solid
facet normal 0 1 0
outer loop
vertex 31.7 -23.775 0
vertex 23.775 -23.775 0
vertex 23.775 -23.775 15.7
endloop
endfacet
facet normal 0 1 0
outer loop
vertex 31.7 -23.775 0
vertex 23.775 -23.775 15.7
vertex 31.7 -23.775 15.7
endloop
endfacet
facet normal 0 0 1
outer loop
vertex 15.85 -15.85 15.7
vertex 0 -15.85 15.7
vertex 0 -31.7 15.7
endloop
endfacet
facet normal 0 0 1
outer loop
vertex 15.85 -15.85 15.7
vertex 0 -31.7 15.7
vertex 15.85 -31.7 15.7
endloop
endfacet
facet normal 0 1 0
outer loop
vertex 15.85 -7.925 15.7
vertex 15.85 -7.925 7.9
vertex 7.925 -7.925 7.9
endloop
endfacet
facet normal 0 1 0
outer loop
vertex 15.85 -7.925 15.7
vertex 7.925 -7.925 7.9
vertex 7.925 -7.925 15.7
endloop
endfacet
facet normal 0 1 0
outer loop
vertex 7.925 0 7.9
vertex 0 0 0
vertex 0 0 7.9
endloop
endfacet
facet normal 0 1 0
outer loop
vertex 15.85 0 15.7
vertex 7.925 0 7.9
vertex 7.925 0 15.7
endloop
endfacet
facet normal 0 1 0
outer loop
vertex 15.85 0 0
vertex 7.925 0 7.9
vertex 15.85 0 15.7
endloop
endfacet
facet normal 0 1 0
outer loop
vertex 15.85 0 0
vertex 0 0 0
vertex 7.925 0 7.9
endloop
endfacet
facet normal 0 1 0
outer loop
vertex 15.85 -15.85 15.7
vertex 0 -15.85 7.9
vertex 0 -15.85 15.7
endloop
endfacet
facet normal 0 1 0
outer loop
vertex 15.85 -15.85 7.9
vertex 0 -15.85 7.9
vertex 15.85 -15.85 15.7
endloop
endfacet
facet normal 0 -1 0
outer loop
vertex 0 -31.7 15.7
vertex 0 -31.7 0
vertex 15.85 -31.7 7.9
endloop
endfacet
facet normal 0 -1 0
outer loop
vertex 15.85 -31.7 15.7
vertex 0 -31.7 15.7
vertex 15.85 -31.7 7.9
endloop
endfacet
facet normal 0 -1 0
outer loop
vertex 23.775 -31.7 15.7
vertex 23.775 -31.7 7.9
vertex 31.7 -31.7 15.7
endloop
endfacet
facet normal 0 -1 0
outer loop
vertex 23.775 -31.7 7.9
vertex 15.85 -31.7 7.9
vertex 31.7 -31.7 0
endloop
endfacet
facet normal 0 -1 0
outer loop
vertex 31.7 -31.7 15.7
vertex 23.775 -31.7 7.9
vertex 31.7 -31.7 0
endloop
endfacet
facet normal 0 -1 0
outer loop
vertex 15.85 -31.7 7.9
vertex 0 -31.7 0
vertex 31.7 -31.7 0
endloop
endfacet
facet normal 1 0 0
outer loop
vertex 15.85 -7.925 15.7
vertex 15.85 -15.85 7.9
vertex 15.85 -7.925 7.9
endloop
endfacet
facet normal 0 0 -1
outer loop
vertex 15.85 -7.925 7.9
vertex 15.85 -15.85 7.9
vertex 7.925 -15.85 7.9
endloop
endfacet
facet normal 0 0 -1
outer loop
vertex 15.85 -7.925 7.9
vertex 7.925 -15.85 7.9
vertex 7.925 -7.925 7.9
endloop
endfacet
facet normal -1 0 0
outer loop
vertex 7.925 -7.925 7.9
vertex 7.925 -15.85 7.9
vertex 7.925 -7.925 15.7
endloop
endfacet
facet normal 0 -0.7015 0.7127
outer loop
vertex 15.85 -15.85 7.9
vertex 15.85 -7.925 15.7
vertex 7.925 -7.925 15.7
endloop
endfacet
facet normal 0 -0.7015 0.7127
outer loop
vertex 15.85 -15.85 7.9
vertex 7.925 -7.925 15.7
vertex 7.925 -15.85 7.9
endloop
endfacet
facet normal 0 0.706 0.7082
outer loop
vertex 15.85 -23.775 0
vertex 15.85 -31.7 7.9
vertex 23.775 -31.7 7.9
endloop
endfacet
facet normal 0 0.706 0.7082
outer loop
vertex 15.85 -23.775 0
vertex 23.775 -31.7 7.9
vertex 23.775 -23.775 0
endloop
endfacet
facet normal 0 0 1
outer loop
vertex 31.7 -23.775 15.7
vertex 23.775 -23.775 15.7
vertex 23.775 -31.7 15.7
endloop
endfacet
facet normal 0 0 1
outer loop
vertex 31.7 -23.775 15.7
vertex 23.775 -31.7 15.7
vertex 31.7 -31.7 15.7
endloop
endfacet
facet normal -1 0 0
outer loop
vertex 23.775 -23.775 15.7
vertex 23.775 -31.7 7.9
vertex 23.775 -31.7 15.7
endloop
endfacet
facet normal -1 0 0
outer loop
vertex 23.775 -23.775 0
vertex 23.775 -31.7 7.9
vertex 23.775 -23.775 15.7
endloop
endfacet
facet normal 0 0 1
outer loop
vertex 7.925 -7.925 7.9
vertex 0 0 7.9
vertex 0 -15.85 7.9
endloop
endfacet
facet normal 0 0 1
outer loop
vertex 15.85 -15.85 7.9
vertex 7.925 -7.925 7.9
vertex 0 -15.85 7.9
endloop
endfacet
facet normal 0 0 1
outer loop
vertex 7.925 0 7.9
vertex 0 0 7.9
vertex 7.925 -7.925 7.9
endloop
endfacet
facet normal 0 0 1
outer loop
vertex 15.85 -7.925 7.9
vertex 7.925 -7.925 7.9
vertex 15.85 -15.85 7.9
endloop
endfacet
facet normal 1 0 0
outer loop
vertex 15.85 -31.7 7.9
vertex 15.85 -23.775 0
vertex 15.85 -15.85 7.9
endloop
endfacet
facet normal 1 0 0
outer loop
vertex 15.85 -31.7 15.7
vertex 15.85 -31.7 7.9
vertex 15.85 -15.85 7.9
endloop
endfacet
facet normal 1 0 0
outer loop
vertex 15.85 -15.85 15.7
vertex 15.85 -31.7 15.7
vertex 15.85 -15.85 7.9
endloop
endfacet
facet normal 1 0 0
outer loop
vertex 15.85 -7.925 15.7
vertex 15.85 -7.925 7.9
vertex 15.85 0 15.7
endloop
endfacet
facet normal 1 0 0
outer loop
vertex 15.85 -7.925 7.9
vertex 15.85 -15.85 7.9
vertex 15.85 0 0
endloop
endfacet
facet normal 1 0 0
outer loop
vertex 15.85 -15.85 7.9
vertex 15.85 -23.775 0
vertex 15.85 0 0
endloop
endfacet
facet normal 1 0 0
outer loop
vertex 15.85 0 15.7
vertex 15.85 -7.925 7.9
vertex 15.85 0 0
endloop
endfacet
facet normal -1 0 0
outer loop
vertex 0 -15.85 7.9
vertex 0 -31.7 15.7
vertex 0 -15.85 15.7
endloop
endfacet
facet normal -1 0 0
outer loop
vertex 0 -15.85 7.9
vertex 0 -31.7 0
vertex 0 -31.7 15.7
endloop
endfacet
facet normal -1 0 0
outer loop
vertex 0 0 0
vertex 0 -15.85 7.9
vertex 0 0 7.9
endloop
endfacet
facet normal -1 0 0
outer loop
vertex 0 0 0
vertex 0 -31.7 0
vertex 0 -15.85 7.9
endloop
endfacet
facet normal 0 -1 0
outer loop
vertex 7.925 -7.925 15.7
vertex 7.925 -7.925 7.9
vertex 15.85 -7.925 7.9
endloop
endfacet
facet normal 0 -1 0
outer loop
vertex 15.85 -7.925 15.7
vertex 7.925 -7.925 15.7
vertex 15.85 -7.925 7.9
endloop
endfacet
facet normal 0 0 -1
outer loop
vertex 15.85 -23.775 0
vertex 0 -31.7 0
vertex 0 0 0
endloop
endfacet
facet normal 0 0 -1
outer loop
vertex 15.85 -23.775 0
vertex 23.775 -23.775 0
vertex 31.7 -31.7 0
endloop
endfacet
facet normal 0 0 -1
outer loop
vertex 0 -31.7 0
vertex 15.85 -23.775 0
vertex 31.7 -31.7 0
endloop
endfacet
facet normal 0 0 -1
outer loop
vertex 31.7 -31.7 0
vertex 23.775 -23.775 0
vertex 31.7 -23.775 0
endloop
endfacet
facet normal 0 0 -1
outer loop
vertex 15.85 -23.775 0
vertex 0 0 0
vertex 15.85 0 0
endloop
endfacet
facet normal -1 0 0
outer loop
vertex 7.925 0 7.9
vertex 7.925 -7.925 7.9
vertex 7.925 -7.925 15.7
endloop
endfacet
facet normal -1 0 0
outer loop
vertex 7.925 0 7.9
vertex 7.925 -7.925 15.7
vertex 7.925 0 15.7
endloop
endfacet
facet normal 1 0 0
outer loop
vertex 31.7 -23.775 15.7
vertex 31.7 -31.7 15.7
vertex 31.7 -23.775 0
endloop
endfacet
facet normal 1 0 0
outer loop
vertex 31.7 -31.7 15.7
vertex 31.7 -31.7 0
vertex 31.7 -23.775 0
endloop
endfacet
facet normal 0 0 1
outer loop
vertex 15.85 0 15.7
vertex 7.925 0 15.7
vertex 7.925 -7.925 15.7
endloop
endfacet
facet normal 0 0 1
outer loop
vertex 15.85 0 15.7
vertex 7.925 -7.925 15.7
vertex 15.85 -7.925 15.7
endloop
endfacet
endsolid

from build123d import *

# Parameters (mm, degrees)
F0_W      = 31.7
F0_H      = 31.7
F1_DEPTH  = 7.9
F2_W      = 15.85
F2_H      = 15.85
F3_DEPTH  = 7.8
F5_DEPTH  = 25
F6_W      = 7.925
F6_H      = 7.925
F7_DEPTH  = 7.8
F8_W      = 7.925
F8_H      = 7.925
F9_DEPTH  = 7.8
F11_DEPTH = 7.925
F13_DEPTH = 7.925


with BuildPart() as f1:
    # F0 (on Top) → F1 (new body)
    with BuildSketch(Plane.XY):
        with Locations((15.85, -15.85)):
            Rectangle(F0_W, F0_H)
    extrude(amount=F1_DEPTH)

    # F2 (on face) → F3 (join)
    with BuildSketch(Plane.XY.offset(7.9)):
        with Locations((7.925, -23.775)):
            Rectangle(F2_W, F2_H)
    extrude(amount=F3_DEPTH)

    # F4 (on face) → F5 (cut)
    with BuildSketch(Plane.XY.offset(7.9)):
        Polygon((15.85, 0), (15.85, -15.85), (15.85, -23.775), (31.7, -23.775), (31.7, 0), align=None)
    extrude(amount=-F5_DEPTH, mode=Mode.SUBTRACT)

    # F6 (on face) → F7 (join)
    with BuildSketch(Plane.XY.offset(7.9)):
        with Locations((27.7375, -27.7375)):
            Rectangle(F6_W, F6_H)
    extrude(amount=F7_DEPTH)

    # F8 (on face) → F9 (join)
    with BuildSketch(Plane.XY.offset(7.9)):
        with Locations((11.8875, -3.9625)):
            Rectangle(F8_W, F8_H)
    extrude(amount=F9_DEPTH)

    # F12 (on face) → F13 (cut, through all)
    with BuildSketch(Plane.YZ.offset(15.85)):
        Polygon((-23.775, 7.9), (-31.7, 7.9), (-23.775, 0), align=None)
    extrude(amount=F13_DEPTH, mode=Mode.SUBTRACT)


with BuildPart() as f11:
    # F10 (on face) → F11 (new body, through all)
    with BuildSketch(Plane.YZ.offset(15.85)):
        Polygon((-7.925, 7.9), (-7.925, 15.7), (-15.85, 7.9), align=None)
    extrude(amount=-F11_DEPTH)


solid = Compound([f1.part, f11.part])
